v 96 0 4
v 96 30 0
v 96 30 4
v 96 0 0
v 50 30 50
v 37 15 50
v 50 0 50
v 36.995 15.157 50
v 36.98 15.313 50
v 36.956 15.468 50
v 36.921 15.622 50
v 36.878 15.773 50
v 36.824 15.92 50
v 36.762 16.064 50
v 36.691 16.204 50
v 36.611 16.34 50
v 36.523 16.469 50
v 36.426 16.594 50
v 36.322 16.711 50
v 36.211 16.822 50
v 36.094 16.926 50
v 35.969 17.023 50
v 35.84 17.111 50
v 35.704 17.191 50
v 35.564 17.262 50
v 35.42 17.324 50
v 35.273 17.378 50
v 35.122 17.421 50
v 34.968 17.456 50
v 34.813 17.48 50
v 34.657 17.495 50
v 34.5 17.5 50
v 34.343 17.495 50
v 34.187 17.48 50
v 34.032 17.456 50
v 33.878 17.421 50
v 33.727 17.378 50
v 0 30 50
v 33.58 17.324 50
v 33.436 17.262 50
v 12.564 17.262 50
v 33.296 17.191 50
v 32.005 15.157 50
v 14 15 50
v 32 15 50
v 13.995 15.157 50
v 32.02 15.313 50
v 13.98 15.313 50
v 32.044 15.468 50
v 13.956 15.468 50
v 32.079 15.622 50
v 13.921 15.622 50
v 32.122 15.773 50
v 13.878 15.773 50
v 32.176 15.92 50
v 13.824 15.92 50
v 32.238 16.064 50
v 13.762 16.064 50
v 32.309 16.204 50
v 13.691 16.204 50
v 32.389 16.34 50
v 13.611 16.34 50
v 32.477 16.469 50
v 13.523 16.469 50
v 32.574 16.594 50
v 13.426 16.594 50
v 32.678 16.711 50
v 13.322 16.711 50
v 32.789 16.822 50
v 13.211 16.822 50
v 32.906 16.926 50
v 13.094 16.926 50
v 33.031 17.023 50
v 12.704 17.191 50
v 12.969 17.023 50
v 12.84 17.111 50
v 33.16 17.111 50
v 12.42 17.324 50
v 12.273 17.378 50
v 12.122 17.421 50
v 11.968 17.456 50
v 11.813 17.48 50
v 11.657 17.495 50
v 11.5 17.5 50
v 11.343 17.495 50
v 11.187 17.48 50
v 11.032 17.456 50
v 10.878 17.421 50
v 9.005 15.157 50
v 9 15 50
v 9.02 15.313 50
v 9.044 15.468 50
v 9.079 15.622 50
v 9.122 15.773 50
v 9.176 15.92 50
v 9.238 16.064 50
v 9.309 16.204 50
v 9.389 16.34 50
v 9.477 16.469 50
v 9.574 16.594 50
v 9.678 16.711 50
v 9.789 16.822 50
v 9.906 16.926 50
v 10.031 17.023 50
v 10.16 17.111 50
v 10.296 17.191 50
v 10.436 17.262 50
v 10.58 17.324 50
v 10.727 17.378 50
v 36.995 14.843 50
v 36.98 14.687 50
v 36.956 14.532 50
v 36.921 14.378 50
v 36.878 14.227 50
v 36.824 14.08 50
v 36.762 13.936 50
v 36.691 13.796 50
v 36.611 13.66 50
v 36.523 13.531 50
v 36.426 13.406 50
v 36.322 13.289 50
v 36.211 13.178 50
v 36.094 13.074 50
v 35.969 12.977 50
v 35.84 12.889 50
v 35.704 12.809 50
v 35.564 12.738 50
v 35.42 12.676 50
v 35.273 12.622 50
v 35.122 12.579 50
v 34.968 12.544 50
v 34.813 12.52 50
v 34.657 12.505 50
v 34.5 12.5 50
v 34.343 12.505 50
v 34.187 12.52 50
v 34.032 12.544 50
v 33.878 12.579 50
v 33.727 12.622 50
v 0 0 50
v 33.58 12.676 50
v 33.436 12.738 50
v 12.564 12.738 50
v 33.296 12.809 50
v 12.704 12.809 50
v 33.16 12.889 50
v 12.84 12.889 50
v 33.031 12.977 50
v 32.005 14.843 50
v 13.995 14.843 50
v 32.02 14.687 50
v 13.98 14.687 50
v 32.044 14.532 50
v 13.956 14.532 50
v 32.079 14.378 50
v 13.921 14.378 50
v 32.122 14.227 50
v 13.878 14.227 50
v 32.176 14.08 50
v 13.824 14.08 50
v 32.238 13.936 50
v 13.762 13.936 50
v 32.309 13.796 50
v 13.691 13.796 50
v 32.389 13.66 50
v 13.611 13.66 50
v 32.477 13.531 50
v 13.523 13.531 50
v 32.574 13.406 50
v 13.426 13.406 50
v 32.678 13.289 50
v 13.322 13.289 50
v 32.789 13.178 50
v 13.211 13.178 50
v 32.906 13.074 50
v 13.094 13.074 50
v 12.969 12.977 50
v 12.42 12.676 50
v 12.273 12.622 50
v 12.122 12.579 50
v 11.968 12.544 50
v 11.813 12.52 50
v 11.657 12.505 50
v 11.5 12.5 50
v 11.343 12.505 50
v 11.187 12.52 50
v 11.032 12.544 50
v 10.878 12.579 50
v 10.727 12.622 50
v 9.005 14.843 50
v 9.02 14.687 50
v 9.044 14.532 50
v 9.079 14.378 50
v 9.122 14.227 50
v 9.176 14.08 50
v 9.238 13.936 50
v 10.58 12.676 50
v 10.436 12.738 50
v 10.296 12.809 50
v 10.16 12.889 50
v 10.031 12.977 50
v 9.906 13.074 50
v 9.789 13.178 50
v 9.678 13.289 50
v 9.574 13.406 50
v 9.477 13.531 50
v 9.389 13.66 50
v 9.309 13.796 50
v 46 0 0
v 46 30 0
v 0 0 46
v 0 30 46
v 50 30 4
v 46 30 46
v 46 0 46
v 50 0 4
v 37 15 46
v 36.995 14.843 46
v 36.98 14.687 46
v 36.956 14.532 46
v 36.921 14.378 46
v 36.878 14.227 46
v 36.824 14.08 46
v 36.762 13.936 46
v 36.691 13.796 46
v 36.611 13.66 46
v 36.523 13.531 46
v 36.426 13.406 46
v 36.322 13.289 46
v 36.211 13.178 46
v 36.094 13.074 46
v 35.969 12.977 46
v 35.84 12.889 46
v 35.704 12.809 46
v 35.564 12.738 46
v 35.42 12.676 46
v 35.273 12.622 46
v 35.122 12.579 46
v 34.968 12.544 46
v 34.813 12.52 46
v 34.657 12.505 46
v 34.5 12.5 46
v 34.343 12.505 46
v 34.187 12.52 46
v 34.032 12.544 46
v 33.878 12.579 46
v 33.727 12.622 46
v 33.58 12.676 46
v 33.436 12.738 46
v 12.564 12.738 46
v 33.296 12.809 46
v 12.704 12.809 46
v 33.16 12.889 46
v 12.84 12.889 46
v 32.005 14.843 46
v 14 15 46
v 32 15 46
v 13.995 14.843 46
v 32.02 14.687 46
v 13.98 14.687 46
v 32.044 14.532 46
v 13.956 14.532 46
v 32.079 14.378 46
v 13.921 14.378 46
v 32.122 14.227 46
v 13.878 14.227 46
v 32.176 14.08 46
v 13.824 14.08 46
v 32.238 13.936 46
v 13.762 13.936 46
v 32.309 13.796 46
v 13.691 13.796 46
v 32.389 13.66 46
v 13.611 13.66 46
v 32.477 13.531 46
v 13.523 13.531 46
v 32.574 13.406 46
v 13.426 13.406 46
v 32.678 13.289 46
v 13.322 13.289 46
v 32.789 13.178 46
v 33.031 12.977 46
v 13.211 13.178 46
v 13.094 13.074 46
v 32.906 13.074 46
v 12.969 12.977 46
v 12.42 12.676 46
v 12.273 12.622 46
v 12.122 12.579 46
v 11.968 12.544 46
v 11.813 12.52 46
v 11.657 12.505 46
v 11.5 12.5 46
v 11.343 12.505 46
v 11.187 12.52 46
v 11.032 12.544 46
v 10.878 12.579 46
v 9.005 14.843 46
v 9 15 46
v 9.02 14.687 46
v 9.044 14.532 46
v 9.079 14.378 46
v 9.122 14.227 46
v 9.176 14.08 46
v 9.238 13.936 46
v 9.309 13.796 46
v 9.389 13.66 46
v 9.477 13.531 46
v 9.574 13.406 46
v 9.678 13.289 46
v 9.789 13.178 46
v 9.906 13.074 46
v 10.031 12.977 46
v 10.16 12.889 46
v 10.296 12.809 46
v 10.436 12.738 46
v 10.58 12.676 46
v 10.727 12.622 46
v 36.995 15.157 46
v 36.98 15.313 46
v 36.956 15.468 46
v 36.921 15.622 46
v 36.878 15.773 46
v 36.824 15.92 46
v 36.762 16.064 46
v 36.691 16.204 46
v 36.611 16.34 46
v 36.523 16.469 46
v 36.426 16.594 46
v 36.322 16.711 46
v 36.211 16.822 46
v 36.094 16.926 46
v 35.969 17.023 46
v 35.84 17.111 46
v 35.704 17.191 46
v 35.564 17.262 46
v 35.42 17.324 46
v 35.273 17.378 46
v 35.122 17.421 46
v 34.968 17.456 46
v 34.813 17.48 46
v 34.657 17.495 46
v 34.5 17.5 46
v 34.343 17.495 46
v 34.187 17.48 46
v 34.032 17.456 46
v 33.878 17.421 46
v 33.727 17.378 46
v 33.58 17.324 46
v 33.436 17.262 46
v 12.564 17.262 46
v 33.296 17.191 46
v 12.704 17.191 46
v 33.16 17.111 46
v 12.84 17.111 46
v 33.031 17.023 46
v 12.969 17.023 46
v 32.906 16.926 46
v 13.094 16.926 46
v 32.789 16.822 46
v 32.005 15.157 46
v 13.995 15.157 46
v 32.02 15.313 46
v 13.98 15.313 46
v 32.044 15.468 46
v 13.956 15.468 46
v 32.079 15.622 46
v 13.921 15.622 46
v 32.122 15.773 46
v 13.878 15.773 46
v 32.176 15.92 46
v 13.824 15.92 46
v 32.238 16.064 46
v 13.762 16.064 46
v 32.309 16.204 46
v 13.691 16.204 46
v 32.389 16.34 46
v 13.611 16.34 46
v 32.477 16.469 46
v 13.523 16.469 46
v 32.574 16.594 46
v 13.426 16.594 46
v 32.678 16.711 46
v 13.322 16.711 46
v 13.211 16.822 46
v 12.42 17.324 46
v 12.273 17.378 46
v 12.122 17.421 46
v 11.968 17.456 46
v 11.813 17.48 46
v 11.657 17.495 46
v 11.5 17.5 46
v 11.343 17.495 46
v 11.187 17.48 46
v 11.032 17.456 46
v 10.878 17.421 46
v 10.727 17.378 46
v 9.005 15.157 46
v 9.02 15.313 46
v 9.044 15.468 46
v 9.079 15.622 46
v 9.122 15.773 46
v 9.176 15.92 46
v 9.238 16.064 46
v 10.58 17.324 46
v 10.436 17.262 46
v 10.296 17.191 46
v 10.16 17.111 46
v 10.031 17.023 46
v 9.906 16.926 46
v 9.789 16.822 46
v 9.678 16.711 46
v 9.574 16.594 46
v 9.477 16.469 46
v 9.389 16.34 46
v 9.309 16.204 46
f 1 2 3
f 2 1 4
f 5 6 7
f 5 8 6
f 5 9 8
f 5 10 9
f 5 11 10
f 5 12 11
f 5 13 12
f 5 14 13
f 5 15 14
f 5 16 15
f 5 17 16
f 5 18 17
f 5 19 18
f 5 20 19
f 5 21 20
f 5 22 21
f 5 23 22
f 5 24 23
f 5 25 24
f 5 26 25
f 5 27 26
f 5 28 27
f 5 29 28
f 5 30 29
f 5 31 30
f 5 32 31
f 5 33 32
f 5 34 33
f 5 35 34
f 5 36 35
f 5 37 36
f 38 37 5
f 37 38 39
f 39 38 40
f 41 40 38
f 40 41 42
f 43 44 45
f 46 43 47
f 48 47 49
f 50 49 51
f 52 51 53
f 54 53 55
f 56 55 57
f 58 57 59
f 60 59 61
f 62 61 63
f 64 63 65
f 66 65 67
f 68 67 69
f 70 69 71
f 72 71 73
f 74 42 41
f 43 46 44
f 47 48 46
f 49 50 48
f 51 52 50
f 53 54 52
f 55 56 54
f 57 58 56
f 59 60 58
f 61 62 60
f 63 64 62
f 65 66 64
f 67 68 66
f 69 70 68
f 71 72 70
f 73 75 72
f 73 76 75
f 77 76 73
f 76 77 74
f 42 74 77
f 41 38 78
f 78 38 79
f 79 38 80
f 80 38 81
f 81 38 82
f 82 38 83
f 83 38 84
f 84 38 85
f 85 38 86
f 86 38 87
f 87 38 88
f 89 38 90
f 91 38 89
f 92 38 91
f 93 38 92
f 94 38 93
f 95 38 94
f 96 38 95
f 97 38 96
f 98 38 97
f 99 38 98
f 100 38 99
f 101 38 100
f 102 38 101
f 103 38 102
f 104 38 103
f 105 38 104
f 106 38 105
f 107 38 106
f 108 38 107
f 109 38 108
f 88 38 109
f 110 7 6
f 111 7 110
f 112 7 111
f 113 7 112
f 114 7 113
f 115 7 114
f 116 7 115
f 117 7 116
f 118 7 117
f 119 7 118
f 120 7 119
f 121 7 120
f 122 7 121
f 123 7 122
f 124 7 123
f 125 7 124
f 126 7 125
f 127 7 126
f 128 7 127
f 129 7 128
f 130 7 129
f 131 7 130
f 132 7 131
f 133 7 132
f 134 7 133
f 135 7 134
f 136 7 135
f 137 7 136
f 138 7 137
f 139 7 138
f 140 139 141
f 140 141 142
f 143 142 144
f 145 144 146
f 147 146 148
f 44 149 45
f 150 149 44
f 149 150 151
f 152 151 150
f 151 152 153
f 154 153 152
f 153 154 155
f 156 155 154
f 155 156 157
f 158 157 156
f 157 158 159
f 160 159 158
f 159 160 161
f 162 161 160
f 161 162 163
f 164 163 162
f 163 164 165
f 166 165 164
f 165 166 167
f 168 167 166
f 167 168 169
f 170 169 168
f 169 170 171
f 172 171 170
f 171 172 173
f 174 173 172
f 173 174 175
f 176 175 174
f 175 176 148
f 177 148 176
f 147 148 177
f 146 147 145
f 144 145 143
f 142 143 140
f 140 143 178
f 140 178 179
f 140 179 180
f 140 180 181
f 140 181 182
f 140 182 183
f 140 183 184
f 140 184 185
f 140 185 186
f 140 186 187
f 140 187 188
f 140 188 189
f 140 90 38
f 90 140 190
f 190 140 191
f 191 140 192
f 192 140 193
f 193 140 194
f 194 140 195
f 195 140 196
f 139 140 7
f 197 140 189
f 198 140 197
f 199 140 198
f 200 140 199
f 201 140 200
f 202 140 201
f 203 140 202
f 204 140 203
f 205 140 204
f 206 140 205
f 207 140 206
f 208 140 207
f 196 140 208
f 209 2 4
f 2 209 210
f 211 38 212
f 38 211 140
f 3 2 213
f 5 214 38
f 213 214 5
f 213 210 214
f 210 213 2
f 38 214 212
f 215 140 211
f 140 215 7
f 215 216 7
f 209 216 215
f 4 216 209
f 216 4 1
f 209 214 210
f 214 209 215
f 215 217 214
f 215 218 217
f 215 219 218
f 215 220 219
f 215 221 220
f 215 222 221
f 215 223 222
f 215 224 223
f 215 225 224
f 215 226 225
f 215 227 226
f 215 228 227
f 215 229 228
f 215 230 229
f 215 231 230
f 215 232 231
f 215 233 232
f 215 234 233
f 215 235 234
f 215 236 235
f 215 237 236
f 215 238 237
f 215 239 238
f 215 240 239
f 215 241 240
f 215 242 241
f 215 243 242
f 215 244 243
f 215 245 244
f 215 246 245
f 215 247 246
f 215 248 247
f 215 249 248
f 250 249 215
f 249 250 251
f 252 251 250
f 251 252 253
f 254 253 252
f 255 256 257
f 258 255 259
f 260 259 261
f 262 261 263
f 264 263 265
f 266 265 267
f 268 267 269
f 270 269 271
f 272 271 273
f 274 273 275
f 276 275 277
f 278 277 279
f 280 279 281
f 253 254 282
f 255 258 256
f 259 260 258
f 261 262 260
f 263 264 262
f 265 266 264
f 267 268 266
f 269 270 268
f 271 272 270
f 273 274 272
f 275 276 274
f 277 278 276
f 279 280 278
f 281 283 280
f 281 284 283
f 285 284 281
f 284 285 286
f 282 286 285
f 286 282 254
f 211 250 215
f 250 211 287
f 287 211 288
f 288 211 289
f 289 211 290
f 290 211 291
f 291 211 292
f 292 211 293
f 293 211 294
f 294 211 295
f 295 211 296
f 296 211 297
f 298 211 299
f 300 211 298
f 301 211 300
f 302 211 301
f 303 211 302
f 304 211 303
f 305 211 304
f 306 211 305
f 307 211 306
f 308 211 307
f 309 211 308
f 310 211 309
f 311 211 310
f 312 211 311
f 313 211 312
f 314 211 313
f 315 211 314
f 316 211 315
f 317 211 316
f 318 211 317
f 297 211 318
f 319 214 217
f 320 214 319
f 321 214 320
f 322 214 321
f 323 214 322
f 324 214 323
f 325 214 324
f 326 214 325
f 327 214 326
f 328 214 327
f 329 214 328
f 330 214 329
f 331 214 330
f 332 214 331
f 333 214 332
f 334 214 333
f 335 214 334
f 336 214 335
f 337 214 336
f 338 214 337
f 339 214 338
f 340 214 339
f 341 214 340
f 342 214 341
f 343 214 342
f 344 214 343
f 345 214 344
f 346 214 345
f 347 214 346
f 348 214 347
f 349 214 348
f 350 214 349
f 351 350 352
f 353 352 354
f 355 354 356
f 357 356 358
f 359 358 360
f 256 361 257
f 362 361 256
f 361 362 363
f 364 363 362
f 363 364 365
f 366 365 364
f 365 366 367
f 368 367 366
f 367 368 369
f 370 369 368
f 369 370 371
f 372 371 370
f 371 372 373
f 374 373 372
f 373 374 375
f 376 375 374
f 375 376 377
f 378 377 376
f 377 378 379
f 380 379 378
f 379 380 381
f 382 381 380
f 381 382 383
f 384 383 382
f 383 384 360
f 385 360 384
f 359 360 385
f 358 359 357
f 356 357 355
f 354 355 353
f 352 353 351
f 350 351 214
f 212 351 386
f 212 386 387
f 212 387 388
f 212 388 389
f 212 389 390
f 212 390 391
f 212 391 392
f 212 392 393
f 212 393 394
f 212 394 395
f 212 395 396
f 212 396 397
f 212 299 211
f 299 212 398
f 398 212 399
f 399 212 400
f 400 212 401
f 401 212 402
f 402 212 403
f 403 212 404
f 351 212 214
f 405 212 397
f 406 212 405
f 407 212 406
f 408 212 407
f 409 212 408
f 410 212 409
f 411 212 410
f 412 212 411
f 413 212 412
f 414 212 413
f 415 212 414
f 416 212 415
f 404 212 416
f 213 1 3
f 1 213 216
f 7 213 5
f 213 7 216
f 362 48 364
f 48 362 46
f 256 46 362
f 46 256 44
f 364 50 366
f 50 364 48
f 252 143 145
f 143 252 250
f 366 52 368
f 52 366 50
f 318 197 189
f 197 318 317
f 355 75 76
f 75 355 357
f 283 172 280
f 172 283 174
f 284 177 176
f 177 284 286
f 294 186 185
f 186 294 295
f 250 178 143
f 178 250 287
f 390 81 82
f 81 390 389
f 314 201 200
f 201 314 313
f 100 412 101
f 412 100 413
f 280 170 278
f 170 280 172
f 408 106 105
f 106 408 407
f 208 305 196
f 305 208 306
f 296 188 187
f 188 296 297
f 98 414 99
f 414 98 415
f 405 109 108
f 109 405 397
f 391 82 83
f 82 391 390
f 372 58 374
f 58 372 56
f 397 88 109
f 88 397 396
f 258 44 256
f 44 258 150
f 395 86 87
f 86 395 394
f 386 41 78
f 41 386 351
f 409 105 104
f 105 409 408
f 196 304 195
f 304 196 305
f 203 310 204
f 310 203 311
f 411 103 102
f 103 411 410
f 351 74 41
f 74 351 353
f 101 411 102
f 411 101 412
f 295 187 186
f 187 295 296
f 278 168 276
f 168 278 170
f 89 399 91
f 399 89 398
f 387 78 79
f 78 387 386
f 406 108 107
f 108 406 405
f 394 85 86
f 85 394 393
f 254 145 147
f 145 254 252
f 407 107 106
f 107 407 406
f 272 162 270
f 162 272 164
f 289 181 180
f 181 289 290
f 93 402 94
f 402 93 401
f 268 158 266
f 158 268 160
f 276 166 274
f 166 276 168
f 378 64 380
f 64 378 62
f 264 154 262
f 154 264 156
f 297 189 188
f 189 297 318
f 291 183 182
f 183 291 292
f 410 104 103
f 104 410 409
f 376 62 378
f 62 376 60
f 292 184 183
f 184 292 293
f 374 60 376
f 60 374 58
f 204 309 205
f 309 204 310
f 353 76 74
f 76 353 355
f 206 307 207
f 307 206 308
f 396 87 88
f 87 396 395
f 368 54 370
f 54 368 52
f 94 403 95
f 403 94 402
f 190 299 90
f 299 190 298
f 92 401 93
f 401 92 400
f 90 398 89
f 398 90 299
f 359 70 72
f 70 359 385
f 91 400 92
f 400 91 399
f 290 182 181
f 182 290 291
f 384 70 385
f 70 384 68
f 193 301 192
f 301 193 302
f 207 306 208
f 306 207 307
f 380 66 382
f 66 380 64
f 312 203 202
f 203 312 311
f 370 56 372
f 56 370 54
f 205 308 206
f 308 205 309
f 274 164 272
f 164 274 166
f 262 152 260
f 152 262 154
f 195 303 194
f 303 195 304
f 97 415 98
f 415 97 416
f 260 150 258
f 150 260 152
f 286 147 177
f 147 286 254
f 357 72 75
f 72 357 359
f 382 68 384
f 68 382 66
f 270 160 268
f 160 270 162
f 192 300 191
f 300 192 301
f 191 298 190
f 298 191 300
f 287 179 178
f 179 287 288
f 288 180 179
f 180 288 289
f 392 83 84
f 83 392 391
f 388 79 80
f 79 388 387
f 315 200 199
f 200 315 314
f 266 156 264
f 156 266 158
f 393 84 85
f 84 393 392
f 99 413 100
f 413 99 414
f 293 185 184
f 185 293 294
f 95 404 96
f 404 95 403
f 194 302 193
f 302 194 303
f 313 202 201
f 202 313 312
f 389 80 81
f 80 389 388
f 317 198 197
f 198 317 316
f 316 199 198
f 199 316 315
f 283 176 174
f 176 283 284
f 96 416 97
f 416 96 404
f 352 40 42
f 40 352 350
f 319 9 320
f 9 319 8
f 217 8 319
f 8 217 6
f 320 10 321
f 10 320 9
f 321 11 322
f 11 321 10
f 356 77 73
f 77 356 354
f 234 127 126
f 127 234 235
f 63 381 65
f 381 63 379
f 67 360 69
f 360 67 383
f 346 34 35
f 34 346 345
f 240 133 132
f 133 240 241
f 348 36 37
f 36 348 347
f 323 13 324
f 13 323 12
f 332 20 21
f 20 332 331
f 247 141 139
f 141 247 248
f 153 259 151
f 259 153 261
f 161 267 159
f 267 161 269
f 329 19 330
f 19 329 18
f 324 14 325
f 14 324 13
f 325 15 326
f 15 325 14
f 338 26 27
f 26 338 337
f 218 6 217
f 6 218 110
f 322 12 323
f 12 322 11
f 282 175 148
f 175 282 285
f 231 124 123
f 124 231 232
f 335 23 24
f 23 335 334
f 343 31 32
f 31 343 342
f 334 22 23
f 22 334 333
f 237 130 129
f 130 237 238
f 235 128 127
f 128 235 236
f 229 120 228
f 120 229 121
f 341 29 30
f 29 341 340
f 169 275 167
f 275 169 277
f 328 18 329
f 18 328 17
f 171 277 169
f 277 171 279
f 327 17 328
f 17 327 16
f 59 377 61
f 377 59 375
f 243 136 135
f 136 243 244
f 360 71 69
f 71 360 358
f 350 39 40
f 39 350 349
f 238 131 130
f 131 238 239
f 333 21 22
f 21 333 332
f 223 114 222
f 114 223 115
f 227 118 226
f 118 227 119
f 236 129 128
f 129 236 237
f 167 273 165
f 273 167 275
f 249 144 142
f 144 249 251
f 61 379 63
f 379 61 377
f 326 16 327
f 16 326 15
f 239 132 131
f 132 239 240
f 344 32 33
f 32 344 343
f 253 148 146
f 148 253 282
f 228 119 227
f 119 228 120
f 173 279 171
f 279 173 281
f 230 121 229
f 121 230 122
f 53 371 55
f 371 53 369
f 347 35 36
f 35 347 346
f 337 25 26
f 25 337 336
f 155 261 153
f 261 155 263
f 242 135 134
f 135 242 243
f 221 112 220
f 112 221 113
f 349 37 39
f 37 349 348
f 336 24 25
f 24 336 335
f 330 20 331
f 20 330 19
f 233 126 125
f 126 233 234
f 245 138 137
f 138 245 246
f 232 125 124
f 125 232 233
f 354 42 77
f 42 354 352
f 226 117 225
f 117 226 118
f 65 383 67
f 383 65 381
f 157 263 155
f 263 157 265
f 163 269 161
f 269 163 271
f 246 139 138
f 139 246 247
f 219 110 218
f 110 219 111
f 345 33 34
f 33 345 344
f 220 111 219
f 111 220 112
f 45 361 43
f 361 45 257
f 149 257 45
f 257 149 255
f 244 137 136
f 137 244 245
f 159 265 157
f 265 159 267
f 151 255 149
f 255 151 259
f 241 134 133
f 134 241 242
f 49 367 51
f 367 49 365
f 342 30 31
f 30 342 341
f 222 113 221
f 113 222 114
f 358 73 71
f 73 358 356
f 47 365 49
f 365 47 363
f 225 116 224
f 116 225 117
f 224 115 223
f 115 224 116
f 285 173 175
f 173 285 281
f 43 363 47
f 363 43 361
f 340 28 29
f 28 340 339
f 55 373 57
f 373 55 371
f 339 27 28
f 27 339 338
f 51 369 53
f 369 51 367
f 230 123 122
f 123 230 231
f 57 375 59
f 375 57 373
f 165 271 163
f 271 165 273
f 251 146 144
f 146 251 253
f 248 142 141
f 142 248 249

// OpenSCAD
height = 46;
width = 30;
thickness = 4;

// cube [x,y,z]
difference() {
  color("blue") cube([(height * 2) + (thickness * 1), width, height + thickness]);
  color("green") cube([height, width + 1, height]);
  translate([height + thickness, 0, thickness]) color("green") cube([height, width + 1, height]);
  
  // holes
  translate([height / 4, width / 2, height]) cylinder(h = thickness, d = 5, $fn = 100);
  translate([(height / 4) * 3, width / 2, height]) cylinder(h = thickness, d = 5, $fn = 100);
}
